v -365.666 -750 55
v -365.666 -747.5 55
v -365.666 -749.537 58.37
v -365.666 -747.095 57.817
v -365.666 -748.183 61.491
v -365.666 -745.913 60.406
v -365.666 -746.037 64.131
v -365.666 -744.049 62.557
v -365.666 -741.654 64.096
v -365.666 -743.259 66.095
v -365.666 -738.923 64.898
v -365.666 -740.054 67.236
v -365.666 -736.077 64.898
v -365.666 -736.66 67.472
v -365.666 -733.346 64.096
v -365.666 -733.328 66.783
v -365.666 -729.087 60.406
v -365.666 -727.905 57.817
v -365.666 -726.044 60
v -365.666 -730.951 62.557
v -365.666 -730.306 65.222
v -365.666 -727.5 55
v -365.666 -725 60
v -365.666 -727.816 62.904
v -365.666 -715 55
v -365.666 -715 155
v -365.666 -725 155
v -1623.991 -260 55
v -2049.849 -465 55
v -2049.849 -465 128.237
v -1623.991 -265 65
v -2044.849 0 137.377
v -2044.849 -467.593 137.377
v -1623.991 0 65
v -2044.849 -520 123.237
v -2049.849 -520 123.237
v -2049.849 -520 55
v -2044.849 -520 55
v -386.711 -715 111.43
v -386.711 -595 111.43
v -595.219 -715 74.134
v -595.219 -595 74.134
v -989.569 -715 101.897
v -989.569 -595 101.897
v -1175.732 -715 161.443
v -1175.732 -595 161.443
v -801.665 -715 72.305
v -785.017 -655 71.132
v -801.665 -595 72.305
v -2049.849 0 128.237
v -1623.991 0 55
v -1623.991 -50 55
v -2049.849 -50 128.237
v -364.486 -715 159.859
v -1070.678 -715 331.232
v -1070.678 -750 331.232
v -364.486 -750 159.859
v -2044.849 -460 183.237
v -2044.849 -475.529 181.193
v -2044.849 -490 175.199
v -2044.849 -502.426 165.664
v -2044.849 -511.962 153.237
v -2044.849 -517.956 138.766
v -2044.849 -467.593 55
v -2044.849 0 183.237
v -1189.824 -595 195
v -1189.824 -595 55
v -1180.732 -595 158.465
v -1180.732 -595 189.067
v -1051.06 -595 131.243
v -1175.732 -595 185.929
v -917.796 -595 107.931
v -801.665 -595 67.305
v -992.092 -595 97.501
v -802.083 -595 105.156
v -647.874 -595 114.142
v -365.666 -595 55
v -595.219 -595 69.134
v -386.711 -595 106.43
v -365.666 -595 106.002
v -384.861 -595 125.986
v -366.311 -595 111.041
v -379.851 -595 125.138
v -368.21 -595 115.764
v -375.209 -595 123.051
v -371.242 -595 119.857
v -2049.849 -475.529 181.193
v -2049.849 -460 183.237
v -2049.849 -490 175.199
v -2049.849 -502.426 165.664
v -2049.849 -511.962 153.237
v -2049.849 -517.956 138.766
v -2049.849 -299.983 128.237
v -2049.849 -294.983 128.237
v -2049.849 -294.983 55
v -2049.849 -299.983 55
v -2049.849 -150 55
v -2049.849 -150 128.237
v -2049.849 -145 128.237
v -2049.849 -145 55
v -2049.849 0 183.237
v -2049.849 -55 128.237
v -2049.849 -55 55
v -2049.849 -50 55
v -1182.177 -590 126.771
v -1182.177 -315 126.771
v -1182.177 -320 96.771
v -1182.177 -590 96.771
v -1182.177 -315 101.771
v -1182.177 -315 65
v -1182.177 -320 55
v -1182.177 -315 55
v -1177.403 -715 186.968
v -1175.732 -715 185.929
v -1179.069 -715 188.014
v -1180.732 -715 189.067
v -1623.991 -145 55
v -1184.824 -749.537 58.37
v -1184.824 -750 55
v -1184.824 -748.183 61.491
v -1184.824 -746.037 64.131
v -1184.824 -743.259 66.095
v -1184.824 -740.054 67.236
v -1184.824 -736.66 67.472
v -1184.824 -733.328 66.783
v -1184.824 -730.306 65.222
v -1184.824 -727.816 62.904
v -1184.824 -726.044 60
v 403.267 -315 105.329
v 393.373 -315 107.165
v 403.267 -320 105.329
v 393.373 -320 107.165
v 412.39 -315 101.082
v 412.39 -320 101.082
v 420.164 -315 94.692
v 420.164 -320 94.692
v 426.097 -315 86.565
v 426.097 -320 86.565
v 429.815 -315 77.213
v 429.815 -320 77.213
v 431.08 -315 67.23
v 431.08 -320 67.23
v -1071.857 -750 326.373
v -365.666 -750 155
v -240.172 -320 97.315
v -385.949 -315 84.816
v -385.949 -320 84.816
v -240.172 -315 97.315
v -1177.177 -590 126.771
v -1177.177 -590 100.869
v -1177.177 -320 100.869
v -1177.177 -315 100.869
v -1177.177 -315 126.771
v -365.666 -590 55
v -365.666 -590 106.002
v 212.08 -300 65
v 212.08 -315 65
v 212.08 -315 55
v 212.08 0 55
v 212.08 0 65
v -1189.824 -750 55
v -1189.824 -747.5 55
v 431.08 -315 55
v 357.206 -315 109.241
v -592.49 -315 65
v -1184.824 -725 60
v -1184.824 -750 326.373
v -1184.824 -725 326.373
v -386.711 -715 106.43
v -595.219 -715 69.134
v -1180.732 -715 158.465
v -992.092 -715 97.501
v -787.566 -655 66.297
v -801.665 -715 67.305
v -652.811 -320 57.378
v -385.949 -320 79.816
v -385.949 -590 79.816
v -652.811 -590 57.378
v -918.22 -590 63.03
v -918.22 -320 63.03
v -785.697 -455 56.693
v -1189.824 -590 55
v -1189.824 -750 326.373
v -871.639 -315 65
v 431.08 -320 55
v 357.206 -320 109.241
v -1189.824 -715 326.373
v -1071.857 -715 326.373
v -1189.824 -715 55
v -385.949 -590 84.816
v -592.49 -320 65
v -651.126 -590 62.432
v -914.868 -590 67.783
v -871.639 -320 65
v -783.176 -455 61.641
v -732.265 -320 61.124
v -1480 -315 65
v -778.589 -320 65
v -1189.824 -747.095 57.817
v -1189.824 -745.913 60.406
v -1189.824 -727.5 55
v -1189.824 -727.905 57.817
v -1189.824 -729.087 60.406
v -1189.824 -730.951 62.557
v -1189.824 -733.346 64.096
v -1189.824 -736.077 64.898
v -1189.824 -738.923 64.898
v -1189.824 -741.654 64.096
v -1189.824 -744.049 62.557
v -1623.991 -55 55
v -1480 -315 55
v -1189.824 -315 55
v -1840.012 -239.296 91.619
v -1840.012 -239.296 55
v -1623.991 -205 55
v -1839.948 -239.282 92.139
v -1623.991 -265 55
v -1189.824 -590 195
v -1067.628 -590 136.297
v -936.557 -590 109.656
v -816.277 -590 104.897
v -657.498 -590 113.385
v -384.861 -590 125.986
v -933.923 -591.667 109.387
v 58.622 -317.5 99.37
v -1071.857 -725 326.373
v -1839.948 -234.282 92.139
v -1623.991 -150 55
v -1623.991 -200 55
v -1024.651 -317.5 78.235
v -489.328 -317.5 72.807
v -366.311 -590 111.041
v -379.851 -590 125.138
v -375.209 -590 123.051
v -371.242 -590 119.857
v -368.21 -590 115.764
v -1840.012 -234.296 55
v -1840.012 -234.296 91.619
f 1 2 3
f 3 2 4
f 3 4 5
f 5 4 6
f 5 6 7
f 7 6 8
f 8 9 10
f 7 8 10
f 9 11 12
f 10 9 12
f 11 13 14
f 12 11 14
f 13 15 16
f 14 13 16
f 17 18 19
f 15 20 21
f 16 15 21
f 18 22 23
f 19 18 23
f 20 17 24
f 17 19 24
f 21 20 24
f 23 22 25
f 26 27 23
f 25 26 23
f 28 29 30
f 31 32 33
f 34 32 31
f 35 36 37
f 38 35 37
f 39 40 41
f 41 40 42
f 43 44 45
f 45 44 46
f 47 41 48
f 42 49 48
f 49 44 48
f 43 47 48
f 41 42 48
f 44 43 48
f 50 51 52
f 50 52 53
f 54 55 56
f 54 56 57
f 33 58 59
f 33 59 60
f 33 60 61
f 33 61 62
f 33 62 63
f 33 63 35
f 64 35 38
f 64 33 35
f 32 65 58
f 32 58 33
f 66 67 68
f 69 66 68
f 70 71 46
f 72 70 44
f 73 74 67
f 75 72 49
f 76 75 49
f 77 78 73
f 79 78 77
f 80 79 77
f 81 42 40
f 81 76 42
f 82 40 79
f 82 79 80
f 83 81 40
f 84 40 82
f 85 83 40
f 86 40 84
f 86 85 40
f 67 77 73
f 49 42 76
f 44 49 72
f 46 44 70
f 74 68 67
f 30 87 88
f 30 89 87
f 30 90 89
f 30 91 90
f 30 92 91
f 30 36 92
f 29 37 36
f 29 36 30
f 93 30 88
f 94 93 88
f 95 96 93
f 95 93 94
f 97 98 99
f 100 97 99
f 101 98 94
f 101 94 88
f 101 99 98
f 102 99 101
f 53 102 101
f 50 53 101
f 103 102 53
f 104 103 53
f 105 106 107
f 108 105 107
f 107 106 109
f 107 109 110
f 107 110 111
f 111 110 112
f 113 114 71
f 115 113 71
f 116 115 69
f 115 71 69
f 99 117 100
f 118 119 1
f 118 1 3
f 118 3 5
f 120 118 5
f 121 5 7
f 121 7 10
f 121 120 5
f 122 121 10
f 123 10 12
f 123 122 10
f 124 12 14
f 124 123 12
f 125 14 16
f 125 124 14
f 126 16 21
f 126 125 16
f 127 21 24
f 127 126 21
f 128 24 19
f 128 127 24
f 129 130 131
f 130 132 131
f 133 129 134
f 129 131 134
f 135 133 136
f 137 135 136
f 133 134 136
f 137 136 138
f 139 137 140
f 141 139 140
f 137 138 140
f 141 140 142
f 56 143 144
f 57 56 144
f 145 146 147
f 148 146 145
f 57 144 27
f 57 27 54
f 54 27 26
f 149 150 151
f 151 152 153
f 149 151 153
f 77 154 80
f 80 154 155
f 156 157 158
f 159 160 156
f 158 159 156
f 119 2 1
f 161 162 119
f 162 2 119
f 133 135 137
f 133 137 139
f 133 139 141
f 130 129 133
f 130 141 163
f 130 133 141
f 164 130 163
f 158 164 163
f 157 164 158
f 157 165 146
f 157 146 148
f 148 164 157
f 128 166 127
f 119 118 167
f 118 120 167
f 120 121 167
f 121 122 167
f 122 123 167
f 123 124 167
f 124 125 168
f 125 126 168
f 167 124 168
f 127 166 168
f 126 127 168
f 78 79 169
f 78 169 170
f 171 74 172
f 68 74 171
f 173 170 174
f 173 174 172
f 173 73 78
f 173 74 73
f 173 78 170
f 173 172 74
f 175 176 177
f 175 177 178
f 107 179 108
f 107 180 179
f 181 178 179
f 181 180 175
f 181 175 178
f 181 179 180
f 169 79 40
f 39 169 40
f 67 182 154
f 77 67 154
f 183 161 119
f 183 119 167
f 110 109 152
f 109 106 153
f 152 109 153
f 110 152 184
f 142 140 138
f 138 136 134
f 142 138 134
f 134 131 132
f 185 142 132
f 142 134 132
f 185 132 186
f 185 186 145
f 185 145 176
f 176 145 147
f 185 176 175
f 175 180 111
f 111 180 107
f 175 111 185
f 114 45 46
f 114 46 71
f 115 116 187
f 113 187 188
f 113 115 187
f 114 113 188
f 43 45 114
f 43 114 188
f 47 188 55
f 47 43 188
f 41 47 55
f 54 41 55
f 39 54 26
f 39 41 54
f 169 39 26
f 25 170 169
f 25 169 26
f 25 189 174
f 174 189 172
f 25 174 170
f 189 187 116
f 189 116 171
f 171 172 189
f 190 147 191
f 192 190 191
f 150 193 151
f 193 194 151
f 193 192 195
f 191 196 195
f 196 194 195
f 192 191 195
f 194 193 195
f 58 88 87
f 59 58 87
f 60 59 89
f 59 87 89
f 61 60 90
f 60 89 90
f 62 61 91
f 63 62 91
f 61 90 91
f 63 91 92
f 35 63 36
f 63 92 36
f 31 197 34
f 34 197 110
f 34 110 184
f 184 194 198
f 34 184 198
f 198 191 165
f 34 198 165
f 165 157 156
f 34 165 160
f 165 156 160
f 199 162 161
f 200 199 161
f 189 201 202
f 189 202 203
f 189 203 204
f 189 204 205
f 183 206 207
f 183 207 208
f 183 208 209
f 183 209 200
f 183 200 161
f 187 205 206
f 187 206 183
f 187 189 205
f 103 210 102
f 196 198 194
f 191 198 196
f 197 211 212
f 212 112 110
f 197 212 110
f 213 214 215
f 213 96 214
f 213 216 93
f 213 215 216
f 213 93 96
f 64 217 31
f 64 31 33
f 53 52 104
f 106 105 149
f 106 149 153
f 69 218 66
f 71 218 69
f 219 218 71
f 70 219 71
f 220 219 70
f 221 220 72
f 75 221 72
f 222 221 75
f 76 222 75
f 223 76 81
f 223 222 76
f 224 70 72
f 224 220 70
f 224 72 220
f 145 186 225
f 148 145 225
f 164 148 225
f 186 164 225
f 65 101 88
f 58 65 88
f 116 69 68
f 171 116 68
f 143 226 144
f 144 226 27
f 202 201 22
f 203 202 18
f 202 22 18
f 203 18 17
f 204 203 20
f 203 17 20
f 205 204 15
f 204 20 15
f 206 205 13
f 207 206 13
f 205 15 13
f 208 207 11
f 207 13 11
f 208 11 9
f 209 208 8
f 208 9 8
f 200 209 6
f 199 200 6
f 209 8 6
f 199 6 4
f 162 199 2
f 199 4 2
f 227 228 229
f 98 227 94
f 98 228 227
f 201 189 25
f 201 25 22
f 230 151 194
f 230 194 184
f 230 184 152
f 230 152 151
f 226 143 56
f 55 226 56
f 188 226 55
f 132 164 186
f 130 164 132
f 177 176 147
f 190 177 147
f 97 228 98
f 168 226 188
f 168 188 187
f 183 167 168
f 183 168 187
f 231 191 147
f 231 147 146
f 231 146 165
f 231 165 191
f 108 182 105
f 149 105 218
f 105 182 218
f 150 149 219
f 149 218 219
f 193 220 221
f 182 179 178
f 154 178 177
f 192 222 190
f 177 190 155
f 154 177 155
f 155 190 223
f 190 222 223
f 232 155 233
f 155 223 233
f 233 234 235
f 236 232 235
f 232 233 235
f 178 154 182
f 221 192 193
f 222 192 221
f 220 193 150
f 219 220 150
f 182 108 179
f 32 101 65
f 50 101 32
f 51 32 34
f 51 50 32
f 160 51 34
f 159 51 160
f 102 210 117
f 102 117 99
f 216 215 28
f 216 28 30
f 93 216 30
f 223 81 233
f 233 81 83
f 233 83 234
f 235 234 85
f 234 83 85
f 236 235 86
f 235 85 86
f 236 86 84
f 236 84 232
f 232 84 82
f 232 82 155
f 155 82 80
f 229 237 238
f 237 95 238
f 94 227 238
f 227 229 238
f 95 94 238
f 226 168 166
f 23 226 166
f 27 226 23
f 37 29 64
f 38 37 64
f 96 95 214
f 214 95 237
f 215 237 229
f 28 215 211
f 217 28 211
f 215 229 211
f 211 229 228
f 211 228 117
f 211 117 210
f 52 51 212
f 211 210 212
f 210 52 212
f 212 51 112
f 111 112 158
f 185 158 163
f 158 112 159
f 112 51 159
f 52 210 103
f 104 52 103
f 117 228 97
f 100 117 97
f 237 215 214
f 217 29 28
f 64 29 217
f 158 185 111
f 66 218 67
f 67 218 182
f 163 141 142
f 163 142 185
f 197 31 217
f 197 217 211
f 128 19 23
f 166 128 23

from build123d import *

# Parameters (mm, degrees)
SZKIC1_W                     = 1841.580423823
SZKIC1_H                     = 10
DODANIE_WYCI_GNI_CIE1_DEPTH  = 315
DODANIE_WYCI_GNI_CIE2_DEPTH  = 5
DODANIE_WYCI_GNI_CIE4_DEPTH  = 270
DODANIE_WYCI_GNI_CIE5_DEPTH  = 5
DODANIE_WYCI_GNI_CIE6_DEPTH  = 120
DODANIE_WYCI_GNI_CIE7_DEPTH  = 10
DODANIE_WYCI_GNI_CIE8_DEPTH  = 824.158490967
WYTNIJ_WYCI_GNI_CIE3_DEPTH   = 800
WYTNIJ_WYCI_GNI_CIE4_DEPTH   = 800
WYTNIJ_WYCI_GNI_CIE6_DEPTH   = 800
WYTNIJ_WYCI_GNI_CIE7_DEPTH   = 800
DODANIE_WYCI_GNI_CIE15_REACH = 1830.605
WYTNIJ_WYCI_GNI_CIE8_DEPTH   = 40
SZKIC26_W                    = 726.687402781
SZKIC26_H                    = 35
DODANIE_WYCI_GNI_CIE16_DEPTH = 5
SZKIC10_W                    = 300
SZKIC10_H                    = 35
DODANIE_WYCI_GNI_CIE19_DEPTH = 5
WYTNIJ_WYCI_GNI_CIE10_DEPTH  = 10
WYTNIJ_WYCI_GNI_CIE11_DEPTH  = 35
WYTNIJ_WYCI_GNI_CIE13_DEPTH  = 70
SZKIC30_W                    = 16.697561016
SZKIC30_H                    = 21.994192029
WYTNIJ_WYCI_GNI_CIE14_DEPTH  = 70
DODANIE_WYCI_GNI_CIE20_DEPTH = 5
WYTNIJ_WYCI_GNI_CIE15_DEPTH  = 5
ZAOKR_GLENIE2_R              = 20
SZKIC33_W                    = 30
SZKIC33_H                    = 275
DODANIE_WYCI_GNI_CIE21_DEPTH = 5
SZKIC34_W                    = 36.535261538
SZKIC34_H                    = 120
DODANIE_WYCI_GNI_CIE22_DEPTH = 5
WYTNIJ_WYCI_GNI_CIE16_DEPTH  = 1825.139427117
SZKIC36_W                    = 10
SZKIC36_H                    = 315
DODANIE_WYCI_GNI_CIE23_DEPTH = 90
WYTNIJ_WYCI_GNI_CIE17_DEPTH  = 15
DODANIE_WYCI_GNI_CIE24_DEPTH = 470
WYTNIJ_WYCI_GNI_CIE18_DEPTH  = 235
DODANIE_WYCI_GNI_CIE25_REACH = 2202.156
DODANIE_WYCI_GNI_CIE26_REACH = 2202.156
SZKIC42_W                    = 425.858416348
SZKIC42_H                    = 5
WYTNIJ_WYCI_GNI_CIE20_REACH  = 2202.156
DODANIE_WYCI_GNI_CIE28_DEPTH = 5
SZKIC47_W                    = 59.404380421
SZKIC47_H                    = 10
DODANIE_WYCI_GNI_CIE29_DEPTH = 20
DODANIE_WYCI_GNI_CIE30_DEPTH = 5
WYTNIJ_WYCI_GNI_CIE21_DEPTH  = 5
ZAOKR_GLENIE3_R              = 40
WYTNIJ_WYCI_GNI_CIE22_DEPTH  = 10
WYTNIJ_WYCI_GNI_CIE23_DEPTH  = 120


with BuildPart() as part:
    # Szkic1 → Dodanie-wyciągnięcie1 (new body)
    with BuildSketch(Plane(origin=(0, 0, 0), x_dir=(1, 0, 0), z_dir=(0, 1, 0))):
        with Locations((-708.709788088, -60)):
            Rectangle(SZKIC1_W, SZKIC1_H)
    extrude(amount=-DODANIE_WYCI_GNI_CIE1_DEPTH)

    # Szkic2 → Dodanie-wyciągnięcie2 (add)
    with BuildSketch(Plane.XZ.offset(315)):
        with BuildLine():
            Line((-1189.824091864, 55), (82.698967418, 55))
            Line((82.698967418, 55), (82.698967418, 125))
            add(Edge.make_bspline(
                [(82.698967418, 125), (-575.048967354, 24.979688265), (-1189.824091864, 215)],
                knots=[0, 0, 0, 1, 1, 1], degree=2))
            Line((-1189.824091864, 215), (-1189.824091864, 55))
        make_face()
    extrude(amount=DODANIE_WYCI_GNI_CIE2_DEPTH)

    # Szkic4 → Dodanie-wyciągnięcie4 (add)
    with BuildSketch(Plane.XZ.offset(320)):
        with BuildLine():
            Line((-1182.177359348, 101.771243176), (-1182.177359348, 96.771243176))
            add(Edge.make_bspline(
                [(-385.949338397, 79.815775507), (-787.330452668, 25.09256948), (-1182.177359348, 96.771243176)],
                knots=[0, 0, 0, 1, 1, 1], degree=2))
            Line((-385.949338397, 79.815775507), (-385.949338397, 84.815775507))
            add(Edge.make_bspline(
                [(-385.949338397, 84.815775507), (-787.330452668, 30.09256948), (-1182.177359348, 101.771243176)],
                knots=[0, 0, 0, 1, 1, 1], degree=2))
        make_face()
    extrude(amount=DODANIE_WYCI_GNI_CIE4_DEPTH)

    # Szkic5 → Dodanie-wyciągnięcie5 (add)
    with BuildSketch(Plane.XZ.offset(590)):
        with BuildLine():
            Line((-1189.824091794, 195), (-1189.824091794, 55))
            Line((-1189.824091794, 55), (-365.665600827, 55))
            Line((-365.665600827, 55), (-365.665600827, 125))
            add(Edge.make_bspline(
                [(-1189.824091794, 195), (-948.463478374, 33.501978751), (-627.926523689, 141.485843373), (-365.665600827, 125)],
                knots=[0, 0, 0, 0, 1, 1, 1, 1], degree=3))
        make_face()
    extrude(amount=DODANIE_WYCI_GNI_CIE5_DEPTH)

    # Szkic6 → Dodanie-wyciągnięcie6 (add)
    with BuildSketch(Plane.XZ.offset(595)):
        with BuildLine():
            Line((-1180.731710733, 163.464738462), (-1180.731710733, 158.464738462))
            add(Edge.make_bspline(
                [(-386.71144151, 106.429912395), (-791.410470683, 0.146312653), (-1180.731710733, 158.464738462)],
                knots=[0, 0, 0, 1, 1, 1], degree=2))
            Line((-386.71144151, 106.429912395), (-386.71144151, 111.429912395))
            add(Edge.make_bspline(
                [(-386.71144151, 111.429912395), (-791.410470683, 5.146312653), (-1180.731710733, 163.464738462)],
                knots=[0, 0, 0, 1, 1, 1], degree=2))
        make_face()
    extrude(amount=DODANIE_WYCI_GNI_CIE6_DEPTH)

    # Szkic7 → Dodanie-wyciągnięcie7 (add)
    with BuildSketch(Plane.XZ.offset(715)):
        Polygon((-1189.824091794, 55), (-365.665600827, 55), (-365.665600827, 155), (-1189.824091794, 355), align=None)
    extrude(amount=DODANIE_WYCI_GNI_CIE7_DEPTH)

    # Szkic9 → Dodanie-wyciągnięcie8 (add)
    with BuildSketch(Plane.ZY.offset(1189.824091794)):
        with BuildLine():
            Line((55, -725), (55, -727.5))
            ThreePointArc((55, -727.5), (65, -737.5), (55, -747.5))
            Line((55, -747.5), (55, -750))
            ThreePointArc((55, -750), (67.236328912, -740.053870546), (60, -726.043560763))
            Line((60, -726.043560763), (60, -725))
            Line((60, -725), (55, -725))
        make_face()
    extrude(amount=-DODANIE_WYCI_GNI_CIE8_DEPTH)

    # Szkic14 → Wytnij-wyciągnięcie3 (cut)
    with BuildSketch(Plane(origin=(0, -315, 0), x_dir=(-1, 0, 0), z_dir=(0, -1, 0))):
        Polygon((-212.080423823, -60), (-152.676043402, -65), (-157.068738745, -100.12092383), (-228.037209254, -94.147587352), align=None)
    extrude(amount=-WYTNIJ_WYCI_GNI_CIE3_DEPTH, mode=Mode.SUBTRACT)

    # Szkic15 → Wytnij-wyciągnięcie4 (cut)
    with BuildSketch(Plane.XZ.offset(315)):
        Polygon((-1629.5, 60), (-1533.991072744, 65), (-1548.721576055, 115.377348391), (-1654.554576766, 99.51372944), align=None)
    extrude(amount=-WYTNIJ_WYCI_GNI_CIE4_DEPTH, mode=Mode.SUBTRACT)

    # Szkic17 → Wytnij-wyciągnięcie6 (cut)
    with BuildSketch(Plane.XY):
        Polygon((212.080423823, -300), (152.676043402, -315), (126.143267326, -456.893573372), (421.986335713, -502.224366108), align=None)
    extrude(amount=WYTNIJ_WYCI_GNI_CIE6_DEPTH, mode=Mode.SUBTRACT)

    # Szkic18 → Wytnij-wyciągnięcie7 (cut)
    with BuildSketch(Plane.XY):
        Polygon((-1629.5, -300), (-1533.991072744, -315), (-1533.991072744, -431.408469581), (-1704.18755073, -396.775994669), align=None)
    extrude(amount=WYTNIJ_WYCI_GNI_CIE7_DEPTH, mode=Mode.SUBTRACT)

    # Dodanie-wyciągnięcie15: up to this face of the body (flat: up to its plane)
    dodanie_wyci_gni_cie15_end = Plane(part.part.faces().sort_by_distance((179.077990255, -308.333333333, 58.888888889))[0])
    # Szkic24 → Dodanie-wyciągnięcie15 (add, up to the picked face)
    with BuildSketch(Plane(origin=(0, 0, 0), x_dir=(1, 0, 0), z_dir=(0, 1, 0)), mode=Mode.PRIVATE) as dodanie_wyci_gni_cie15_sk1:
        Polygon((212.080423823, -60), (152.676043402, -65), (212.080423823, -65), align=None)
    dodanie_wyci_gni_cie15_tool1 = split(extrude(dodanie_wyci_gni_cie15_sk1.sketch, amount=-DODANIE_WYCI_GNI_CIE15_REACH, mode=Mode.PRIVATE), bisect_by=dodanie_wyci_gni_cie15_end, keep=Keep.BOTH, mode=Mode.PRIVATE)
    add(dodanie_wyci_gni_cie15_tool1.solids().sort_by(Axis((192.278964, 0, 63.333333), (0, -1, 0)))[0])

    # Szkic25 → Wytnij-wyciągnięcie8 (cut, symmetric)
    with BuildSketch(Plane.XZ.offset(725)):
        Polygon((-1071.856786677, 326.372665231), (-1189.824091794, 326.372665231), (-1281.285885853, 396.255102667), (-1102.826584063, 410.27690495), align=None)
    extrude(amount=WYTNIJ_WYCI_GNI_CIE8_DEPTH, both=True, mode=Mode.SUBTRACT)

    # Szkic26 → Dodanie-wyciągnięcie16 (add)
    with BuildSketch(Plane(origin=(15.185934362, 0, 62.578083739), x_dir=(0.9717950017399135, 0, -0.23582721342822507), z_dir=(0.23582721342822507, 0, 0.9717950017399135))):
        with Locations((-755.248922664, -732.5)):
            Rectangle(SZKIC26_W, SZKIC26_H)
    extrude(amount=DODANIE_WYCI_GNI_CIE16_DEPTH)

    # Szkic10 → Dodanie-wyciągnięcie19 (add)
    with BuildSketch(Plane.ZY.offset(1189.824091794)):
        with Locations((205, -732.5)):
            Rectangle(SZKIC10_W, SZKIC10_H)
    extrude(amount=-DODANIE_WYCI_GNI_CIE19_DEPTH)

    # Szkic27 → Wytnij-wyciągnięcie10 (cut)
    with BuildSketch(Plane(origin=(-1184.824091794, 0, 0), x_dir=(0, 0, -1), z_dir=(1, 0, 0))):
        with BuildLine():
            Line((-55, -747.5), (-38.951461032, -762.248984803))
            Line((-38.951461032, -762.248984803), (-37.343567768, -710.656236911))
            Line((-37.343567768, -710.656236911), (-55, -727.5))
            ThreePointArc((-55, -727.5), (-65, -737.5), (-55, -747.5))
        make_face()
    extrude(amount=-WYTNIJ_WYCI_GNI_CIE10_DEPTH, mode=Mode.SUBTRACT)

    # Szkic28 → Wytnij-wyciągnięcie11 (cut, symmetric)
    with BuildSketch(Plane.XZ.offset(725)):
        Polygon((-1184.824091794, 326.372665231), (-1217.650135451, 326.372665231), (-1219.406429923, 378.737546141), (-1162.034143854, 378.737546141), align=None)
    extrude(amount=WYTNIJ_WYCI_GNI_CIE11_DEPTH, both=True, mode=Mode.SUBTRACT)

    # Szkic29 → Wytnij-wyciągnięcie13 (cut)
    with BuildSketch(Plane.XZ.offset(320)):
        with BuildLine():
            Line((-385.949338397, 84.815775507), (-385.949338397, 334.407178537))
            Line((-385.949338397, 334.407178537), (-1182.177359348, 473.468106308))
            Line((-1182.177359348, 473.468106308), (-1313.585801573, 196.645885604))
            Line((-1313.585801573, 196.645885604), (-1213.513918971, 101.771243176))
            Line((-1213.513918971, 101.771243176), (-1182.177359348, 101.771243176))
            add(Edge.make_bspline(
                [(-871.63878498, 65), (-1027.410026315, 73.675500305), (-1182.177359348, 101.771243176)],
                knots=[0, 0, 0, 1, 1, 1], degree=2))
            Line((-871.63878498, 65), (-592.490024907, 65))
            add(Edge.make_bspline(
                [(-385.949338397, 84.815775507), (-489.436864274, 70.706568575), (-592.490024907, 65)],
                knots=[0, 0, 0, 1, 1, 1], degree=2))
        make_face()
    extrude(amount=-WYTNIJ_WYCI_GNI_CIE13_DEPTH, mode=Mode.SUBTRACT)

    # Szkic30 → Wytnij-wyciągnięcie14 (cut)
    with BuildSketch(Plane.XY.offset(101.771243176)):
        with Locations((-1190.526139856, -325.997096015)):
            Rectangle(SZKIC30_W, SZKIC30_H)
    extrude(amount=-WYTNIJ_WYCI_GNI_CIE14_DEPTH, mode=Mode.SUBTRACT)

    # Szkic31 → Dodanie-wyciągnięcie20 (add)
    with BuildSketch(Plane.XZ.offset(320)):
        Polygon((82.698967418, 125), (-385.949338397, 90.579084574), (-211.590498137, 70.301208148), (82.698967418, 100.951939948), align=None)
    extrude(amount=-DODANIE_WYCI_GNI_CIE20_DEPTH)

    # Szkic32 → Wytnij-wyciągnięcie15 (cut)
    with BuildSketch(Plane(origin=(0, -315, 0), x_dir=(1, 0, 0), z_dir=(0, 1, 0))):
        Polygon((-385.949338397, -84.815775507), (82.698967418, -125), (43.251165214, -321.645953954), (-385.949338397, -284.844179199), align=None)
    extrude(amount=-WYTNIJ_WYCI_GNI_CIE15_DEPTH, mode=Mode.SUBTRACT)

    # Zaokrąglenie2
    zaokr_glenie2_edges = [part.edges().sort_by_distance(p)[0] for p in [
        (-365.665600827, -592.5, 125),
    ]]
    fillet(zaokr_glenie2_edges, radius=ZAOKR_GLENIE2_R)

    # Szkic33 → Dodanie-wyciągnięcie21 (add)
    with BuildSketch(Plane.ZY.offset(1182.177359348)):
        with Locations((111.771243176, -452.5)):
            Rectangle(SZKIC33_W, SZKIC33_H)
    extrude(amount=-DODANIE_WYCI_GNI_CIE21_DEPTH)

    # Szkic34 → Dodanie-wyciągnięcie22 (add)
    with BuildSketch(Plane.ZY.offset(1180.731710733)):
        with Locations((176.732369231, -655)):
            Rectangle(SZKIC34_W, SZKIC34_H)
    extrude(amount=-DODANIE_WYCI_GNI_CIE22_DEPTH)

    # Szkic35 → Wytnij-wyciągnięcie16 (cut, through all)
    with BuildSketch(Plane(origin=(0, 0, 0), x_dir=(1, 0, 0), z_dir=(0, 1, 0))):
        Polygon((-1533.991072744, -65), (-1533.991072744, -13.036157564), (-1638.767665128, -13.036157564), (-1638.767665128, -80.773392513), (-1533.991072744, -80.773392513), align=None)
    extrude(amount=-WYTNIJ_WYCI_GNI_CIE16_DEPTH, mode=Mode.SUBTRACT)

    # Szkic36 → Dodanie-wyciągnięcie23 (add)
    with BuildSketch(Plane.ZY.offset(1533.991072744)):
        with Locations((60, -157.5)):
            Rectangle(SZKIC36_W, SZKIC36_H)
    extrude(amount=DODANIE_WYCI_GNI_CIE23_DEPTH)

    # Szkic37 → Wytnij-wyciągnięcie17 (cut)
    with BuildSketch(Plane.XY.offset(65)):
        Polygon((-1623.991072744, -265), (-1480, -315), (-1582.155270027, -427.098221847), (-1743.661021139, -471.749811861), (-1686.658991335, -216.190711572), align=None)
    extrude(amount=-WYTNIJ_WYCI_GNI_CIE17_DEPTH, mode=Mode.SUBTRACT)

    # Szkic38 → Dodanie-wyciągnięcie24 (add)
    with BuildSketch(Plane(origin=(0, 0, 0), x_dir=(1, 0, 0), z_dir=(0, 1, 0))):
        Polygon((-1623.991072744, -65), (-1623.991072744, -55), (-2049.849489092, -128.23732135), (-2049.849489092, -138.23732135), align=None)
    extrude(amount=-DODANIE_WYCI_GNI_CIE24_DEPTH)

    # Szkic39 → Wytnij-wyciągnięcie18 (cut, symmetric)
    with BuildSketch(Plane.XY.offset(65)):
        Polygon((-1623.991072744, -265), (-2049.849489092, -470), (-2049.849489092, -632.364405532), (-1604.615661805, -507.9476393), align=None)
    extrude(amount=WYTNIJ_WYCI_GNI_CIE18_DEPTH, both=True, mode=Mode.SUBTRACT)

    # Dodanie-wyciągnięcie25: up to this face of the body (flat: up to its plane)
    dodanie_wyci_gni_cie25_end = Plane(part.part.faces().sort_by_distance((-1856.716420453, -188.514739229, 95.023116656))[0])
    # Szkic40 → Dodanie-wyciągnięcie25 (add, up to the picked face)
    with BuildSketch(Plane(origin=(0, 0, 55), x_dir=(-1, 0, 0), z_dir=(0, 0, -1)), mode=Mode.PRIVATE) as dodanie_wyci_gni_cie25_sk1:
        Polygon((1623.991072744, -265), (2049.849489092, -470), (2049.849489092, -465), (1623.991072744, -260), align=None)
    dodanie_wyci_gni_cie25_tool1 = split(extrude(dodanie_wyci_gni_cie25_sk1.sketch, amount=-DODANIE_WYCI_GNI_CIE25_REACH, mode=Mode.PRIVATE), bisect_by=dodanie_wyci_gni_cie25_end, keep=Keep.BOTH, mode=Mode.PRIVATE)
    add(dodanie_wyci_gni_cie25_tool1.solids().sort_by(Axis((-1836.920281, -365, 55), (0, 0, 1)))[0])

    # Dodanie-wyciągnięcie26: up to this face of the body (flat: up to its plane)
    dodanie_wyci_gni_cie26_end = Plane(part.part.faces().sort_by_distance((-1856.989470654, -186.08045977, 95.07007467))[0])
    # Szkic42 → Dodanie-wyciągnięcie26 (add, up to the picked face)
    with BuildSketch(Plane(origin=(0, 0, 55), x_dir=(-1, 0, 0), z_dir=(0, 0, -1)), mode=Mode.PRIVATE) as dodanie_wyci_gni_cie26_sk1:
        with BuildLine():
            Line((1623.991072744, -244.355149627), (1623.991072744, -239.355149627))
            add(Edge.make_bspline(
                [(2049.849489092, -401.340406152), (1855.427484027, -273.909465931), (1623.991072744, -239.355149627)],
                knots=[0, 0, 0, 1, 1, 1], degree=2))
            Line((2049.849489092, -401.340406152), (2049.849489092, -406.340406152))
            add(Edge.make_bspline(
                [(1623.991072744, -244.355149627), (1855.427484027, -278.909465931), (2049.849489092, -406.340406152)],
                knots=[0, 0, 0, 1, 1, 1], degree=2))
        make_face()
    dodanie_wyci_gni_cie26_tool1 = split(extrude(dodanie_wyci_gni_cie26_sk1.sketch, amount=-DODANIE_WYCI_GNI_CIE26_REACH, mode=Mode.PRIVATE), bisect_by=dodanie_wyci_gni_cie26_end, keep=Keep.BOTH, mode=Mode.PRIVATE)
    # Szkic42 → Dodanie-wyciągnięcie26 (add, up to the picked face)
    with BuildSketch(Plane(origin=(0, 0, 55), x_dir=(-1, 0, 0), z_dir=(0, 0, -1)), mode=Mode.PRIVATE) as dodanie_wyci_gni_cie26_sk2:
        with BuildLine():
            Line((1623.991072744, -200), (1623.991072744, -205))
            add(Edge.make_bspline(
                [(1623.991072744, -205), (1843.10350801, -226.100859593), (2049.849489092, -299.983230738)],
                knots=[0, 0, 0, 1, 1, 1], degree=2))
            Line((2049.849489092, -299.983230738), (2049.849489092, -294.983230738))
            add(Edge.make_bspline(
                [(1623.991072744, -200), (1843.10350801, -221.100859593), (2049.849489092, -294.983230738)],
                knots=[0, 0, 0, 1, 1, 1], degree=2))
        make_face()
    dodanie_wyci_gni_cie26_tool2 = split(extrude(dodanie_wyci_gni_cie26_sk2.sketch, amount=-DODANIE_WYCI_GNI_CIE26_REACH, mode=Mode.PRIVATE), bisect_by=dodanie_wyci_gni_cie26_end, keep=Keep.BOTH, mode=Mode.PRIVATE)
    # Szkic42 → Dodanie-wyciągnięcie26 (add, up to the picked face)
    with BuildSketch(Plane(origin=(0, 0, 55), x_dir=(-1, 0, 0), z_dir=(0, 0, -1)), mode=Mode.PRIVATE) as dodanie_wyci_gni_cie26_sk3:
        with Locations((1836.920280918, -52.5)):
            Rectangle(SZKIC42_W, SZKIC42_H)
    dodanie_wyci_gni_cie26_tool3 = split(extrude(dodanie_wyci_gni_cie26_sk3.sketch, amount=-DODANIE_WYCI_GNI_CIE26_REACH, mode=Mode.PRIVATE), bisect_by=dodanie_wyci_gni_cie26_end, keep=Keep.BOTH, mode=Mode.PRIVATE)
    # Szkic42 → Dodanie-wyciągnięcie26 (add, up to the picked face)
    with BuildSketch(Plane(origin=(0, 0, 55), x_dir=(-1, 0, 0), z_dir=(0, 0, -1)), mode=Mode.PRIVATE) as dodanie_wyci_gni_cie26_sk4:
        with Locations((1836.920280918, -147.5)):
            Rectangle(SZKIC42_W, SZKIC42_H)
    dodanie_wyci_gni_cie26_tool4 = split(extrude(dodanie_wyci_gni_cie26_sk4.sketch, amount=-DODANIE_WYCI_GNI_CIE26_REACH, mode=Mode.PRIVATE), bisect_by=dodanie_wyci_gni_cie26_end, keep=Keep.BOTH, mode=Mode.PRIVATE)
    add(dodanie_wyci_gni_cie26_tool1.solids().sort_by(Axis((-1628.565343, -241.85515, 55), (0, 0, 1)))[0])
    add(dodanie_wyci_gni_cie26_tool2.solids().sort_by(Axis((-1628.365453, -202.5, 55), (0, 0, 1)))[0])
    add(dodanie_wyci_gni_cie26_tool3.solids().sort_by(Axis((-1836.920281, -52.5, 55), (0, 0, 1)))[0])
    add(dodanie_wyci_gni_cie26_tool4.solids().sort_by(Axis((-1836.920281, -147.5, 55), (0, 0, 1)))[0])

    # Wytnij-wyciągnięcie20: up to this face of the body (flat: up to its plane)
    wytnij_wyci_gni_cie20_end = Plane(part.part.faces().sort_by_distance((-1876.106863036, -284.989952008, 98.357802599))[0])
    # Szkic44 → Wytnij-wyciągnięcie20 (cut, up to the picked face)
    with BuildSketch(Plane(origin=(0, 0, 55), x_dir=(-1, 0, 0), z_dir=(0, 0, -1)), mode=Mode.PRIVATE) as wytnij_wyci_gni_cie20_sk1:
        with BuildLine():
            Line((2049.849489092, -406.340406152), (2049.849489092, -401.340406152))
            add(Edge.make_bspline(
                [(1623.991072744, -239.355149627), (1855.427484027, -273.909465931), (2049.849489092, -401.340406152)],
                knots=[0, 0, 0, 1, 1, 1], degree=2))
            Line((1623.991072744, -239.355149627), (1623.991072744, -244.355149627))
            add(Edge.make_bspline(
                [(2049.849489092, -406.340406152), (1855.427484027, -278.909465931), (1623.991072744, -244.355149627)],
                knots=[0, 0, 0, 1, 1, 1], degree=2))
        make_face()
    wytnij_wyci_gni_cie20_tool1 = split(extrude(wytnij_wyci_gni_cie20_sk1.sketch, amount=-WYTNIJ_WYCI_GNI_CIE20_REACH, mode=Mode.PRIVATE), bisect_by=wytnij_wyci_gni_cie20_end, keep=Keep.BOTH, mode=Mode.PRIVATE)
    add(wytnij_wyci_gni_cie20_tool1.solids().sort_by(Axis((-2049.392062, -403.840406, 55), (0, 0, 1)))[0], mode=Mode.SUBTRACT)

    # Szkic45 → Dodanie-wyciągnięcie28 (add)
    with BuildSketch(Plane.ZY.offset(2049.849489092)):
        with BuildLine():
            Line((128.23732135, 0), (183.23732135, 0))
            Line((183.23732135, 0), (183.23732135, -460))
            ThreePointArc((183.23732135, -460), (165.663728222, -502.426406871), (123.23732135, -520))
            Line((123.23732135, -520), (55, -520))
            Line((55, -520), (55, -465))
            Line((55, -465), (128.23732135, -465))
            Line((128.23732135, -465), (128.23732135, 0))
        make_face()
    extrude(amount=-DODANIE_WYCI_GNI_CIE28_DEPTH)

    # Szkic47 → Dodanie-wyciągnięcie29 (add)
    with BuildSketch(Plane.XZ.offset(315)):
        with Locations((182.378233613, 60)):
            Rectangle(SZKIC47_W, SZKIC47_H)
    extrude(amount=-DODANIE_WYCI_GNI_CIE29_DEPTH)

    # Szkic48 → Dodanie-wyciągnięcie30 (add)
    with BuildSketch(Plane.XZ.offset(315)):
        Polygon((82.698967418, 125), (431.080423823, 105), (431.080423823, 55), (212.080423823, 55), (82.698967418, 55), align=None)
    extrude(amount=DODANIE_WYCI_GNI_CIE30_DEPTH)

    # Szkic49 → Wytnij-wyciągnięcie21 (cut)
    with BuildSketch(Plane.XZ.offset(320)):
        with BuildLine():
            Line((-29.805838274, 115.353281315), (-93.441590749, 240.975899277))
            Line((-93.441590749, 240.975899277), (363.646365475, 245.253460365))
            Line((363.646365475, 245.253460365), (300.768997598, 112.480962251))
            add(Edge.make_bspline(
                [(-29.805838274, 115.353281315), (135.498032571, 122.219856749), (300.768997598, 112.480962251)],
                knots=[0, 0, 0, 1, 1, 1], degree=2))
        make_face()
    extrude(amount=-WYTNIJ_WYCI_GNI_CIE21_DEPTH, mode=Mode.SUBTRACT)

    # Zaokrąglenie3
    zaokr_glenie3_edges = [part.edges().sort_by_distance(p)[0] for p in [
        (431.080423823, -317.5, 105),
    ]]
    fillet(zaokr_glenie3_edges, radius=ZAOKR_GLENIE3_R)

    # Szkic50 → Wytnij-wyciągnięcie22 (cut)
    with BuildSketch(Plane.XZ.offset(320)):
        with BuildLine():
            Line((-240.172445172, 97.315407599), (-253.233513174, 230.819913371))
            Line((-253.233513174, 230.819913371), (380.265543059, 230.819913371))
            Line((380.265543059, 230.819913371), (357.205892856, 109.241013958))
            add(Edge.make_bspline(
                [(-240.172445172, 97.315407599), (58.727979329, 95.460968942), (357.205892856, 109.241013958)],
                knots=[0, 0, 0, 1, 1, 1], degree=2))
        make_face()
    extrude(amount=-WYTNIJ_WYCI_GNI_CIE22_DEPTH, mode=Mode.SUBTRACT)

    # Szkic53 → Wytnij-wyciągnięcie23 (cut)
    with BuildSketch(Plane(origin=(0, -595, 0), x_dir=(1, 0, 0), z_dir=(0, 1, 0))):
        with BuildLine():
            Line((-1180.731710733, -189.066503083), (-1180.731710733, -195))
            Line((-1180.731710733, -195), (-1175.731710733, -195))
            Line((-1175.731710733, -195), (-1175.731710733, -185.928934683))
            ThreePointArc((-1175.731710733, -185.928934683), (-1178.236624803, -187.489887866), (-1180.731710733, -189.066503083))
        make_face()
    extrude(amount=-WYTNIJ_WYCI_GNI_CIE23_DEPTH, mode=Mode.SUBTRACT)


solid = part.part
